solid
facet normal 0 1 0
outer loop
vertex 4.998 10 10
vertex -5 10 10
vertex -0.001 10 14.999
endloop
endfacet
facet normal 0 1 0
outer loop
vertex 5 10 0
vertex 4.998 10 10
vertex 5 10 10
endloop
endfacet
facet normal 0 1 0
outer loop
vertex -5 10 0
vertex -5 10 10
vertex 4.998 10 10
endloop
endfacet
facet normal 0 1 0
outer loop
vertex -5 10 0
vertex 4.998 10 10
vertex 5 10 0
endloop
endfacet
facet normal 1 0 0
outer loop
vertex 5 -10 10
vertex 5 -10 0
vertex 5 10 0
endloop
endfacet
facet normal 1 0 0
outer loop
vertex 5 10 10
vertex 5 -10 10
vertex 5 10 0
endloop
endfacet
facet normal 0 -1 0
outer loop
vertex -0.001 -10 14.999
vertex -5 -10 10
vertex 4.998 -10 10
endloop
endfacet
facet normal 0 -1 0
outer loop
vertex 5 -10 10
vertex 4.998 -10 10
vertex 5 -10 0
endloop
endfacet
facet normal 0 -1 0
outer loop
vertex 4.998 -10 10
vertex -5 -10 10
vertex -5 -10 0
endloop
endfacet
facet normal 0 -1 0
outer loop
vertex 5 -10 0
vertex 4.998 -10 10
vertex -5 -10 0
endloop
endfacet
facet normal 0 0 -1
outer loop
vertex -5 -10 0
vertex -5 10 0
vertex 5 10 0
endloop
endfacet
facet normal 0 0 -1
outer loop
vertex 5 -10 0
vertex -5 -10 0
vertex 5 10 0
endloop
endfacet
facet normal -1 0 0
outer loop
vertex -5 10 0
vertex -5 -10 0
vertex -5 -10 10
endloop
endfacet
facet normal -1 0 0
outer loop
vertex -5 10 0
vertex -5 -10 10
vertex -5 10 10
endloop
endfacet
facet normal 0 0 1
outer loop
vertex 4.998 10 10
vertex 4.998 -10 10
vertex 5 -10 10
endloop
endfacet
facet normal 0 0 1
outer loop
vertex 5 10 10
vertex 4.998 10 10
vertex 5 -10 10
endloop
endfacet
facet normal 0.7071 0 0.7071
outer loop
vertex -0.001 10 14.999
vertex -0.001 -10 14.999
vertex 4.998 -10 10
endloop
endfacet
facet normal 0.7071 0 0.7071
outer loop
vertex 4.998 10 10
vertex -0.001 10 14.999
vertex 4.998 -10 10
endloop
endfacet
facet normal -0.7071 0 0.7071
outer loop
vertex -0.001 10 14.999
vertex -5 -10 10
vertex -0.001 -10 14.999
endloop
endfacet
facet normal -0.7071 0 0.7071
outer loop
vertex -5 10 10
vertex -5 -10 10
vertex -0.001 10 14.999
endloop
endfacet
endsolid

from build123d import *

# Parameters (mm, degrees)
BOX001_W               = 7.07
BOX001_H               = 20
BOX001_DEPTH           = 7.07
BOX001_PLACEMENT_ANGLE = 45
BOX_W                  = 10
BOX_H                  = 20
BOX_DEPTH              = 10


with BuildPart() as cubo001:
    # Box001 → Box001 (new body)
    with BuildSketch(Plane.XY):
        with Locations((3.535, 10)):
            Rectangle(BOX001_W, BOX001_H)
    extrude(amount=BOX001_DEPTH)


with BuildPart() as cubo001_1:
    # Box001 placement: moved
    add(cubo001.part.moved(Location((-5, -10, 10))).rotate(Axis((-5, -10, 10), (0, 1, 0)), BOX001_PLACEMENT_ANGLE))


with BuildPart() as fusion:
    # Box → Box (new body)
    with BuildSketch(Plane(origin=(-5, -10, 0), x_dir=(1, 0, 0), z_dir=(0, 0, 1))):
        with Locations((5, 10)):
            Rectangle(BOX_W, BOX_H)
    extrude(amount=BOX_DEPTH)

    # Fusion: union Cubo001
    add(cubo001_1.part)


solid = fusion.part
